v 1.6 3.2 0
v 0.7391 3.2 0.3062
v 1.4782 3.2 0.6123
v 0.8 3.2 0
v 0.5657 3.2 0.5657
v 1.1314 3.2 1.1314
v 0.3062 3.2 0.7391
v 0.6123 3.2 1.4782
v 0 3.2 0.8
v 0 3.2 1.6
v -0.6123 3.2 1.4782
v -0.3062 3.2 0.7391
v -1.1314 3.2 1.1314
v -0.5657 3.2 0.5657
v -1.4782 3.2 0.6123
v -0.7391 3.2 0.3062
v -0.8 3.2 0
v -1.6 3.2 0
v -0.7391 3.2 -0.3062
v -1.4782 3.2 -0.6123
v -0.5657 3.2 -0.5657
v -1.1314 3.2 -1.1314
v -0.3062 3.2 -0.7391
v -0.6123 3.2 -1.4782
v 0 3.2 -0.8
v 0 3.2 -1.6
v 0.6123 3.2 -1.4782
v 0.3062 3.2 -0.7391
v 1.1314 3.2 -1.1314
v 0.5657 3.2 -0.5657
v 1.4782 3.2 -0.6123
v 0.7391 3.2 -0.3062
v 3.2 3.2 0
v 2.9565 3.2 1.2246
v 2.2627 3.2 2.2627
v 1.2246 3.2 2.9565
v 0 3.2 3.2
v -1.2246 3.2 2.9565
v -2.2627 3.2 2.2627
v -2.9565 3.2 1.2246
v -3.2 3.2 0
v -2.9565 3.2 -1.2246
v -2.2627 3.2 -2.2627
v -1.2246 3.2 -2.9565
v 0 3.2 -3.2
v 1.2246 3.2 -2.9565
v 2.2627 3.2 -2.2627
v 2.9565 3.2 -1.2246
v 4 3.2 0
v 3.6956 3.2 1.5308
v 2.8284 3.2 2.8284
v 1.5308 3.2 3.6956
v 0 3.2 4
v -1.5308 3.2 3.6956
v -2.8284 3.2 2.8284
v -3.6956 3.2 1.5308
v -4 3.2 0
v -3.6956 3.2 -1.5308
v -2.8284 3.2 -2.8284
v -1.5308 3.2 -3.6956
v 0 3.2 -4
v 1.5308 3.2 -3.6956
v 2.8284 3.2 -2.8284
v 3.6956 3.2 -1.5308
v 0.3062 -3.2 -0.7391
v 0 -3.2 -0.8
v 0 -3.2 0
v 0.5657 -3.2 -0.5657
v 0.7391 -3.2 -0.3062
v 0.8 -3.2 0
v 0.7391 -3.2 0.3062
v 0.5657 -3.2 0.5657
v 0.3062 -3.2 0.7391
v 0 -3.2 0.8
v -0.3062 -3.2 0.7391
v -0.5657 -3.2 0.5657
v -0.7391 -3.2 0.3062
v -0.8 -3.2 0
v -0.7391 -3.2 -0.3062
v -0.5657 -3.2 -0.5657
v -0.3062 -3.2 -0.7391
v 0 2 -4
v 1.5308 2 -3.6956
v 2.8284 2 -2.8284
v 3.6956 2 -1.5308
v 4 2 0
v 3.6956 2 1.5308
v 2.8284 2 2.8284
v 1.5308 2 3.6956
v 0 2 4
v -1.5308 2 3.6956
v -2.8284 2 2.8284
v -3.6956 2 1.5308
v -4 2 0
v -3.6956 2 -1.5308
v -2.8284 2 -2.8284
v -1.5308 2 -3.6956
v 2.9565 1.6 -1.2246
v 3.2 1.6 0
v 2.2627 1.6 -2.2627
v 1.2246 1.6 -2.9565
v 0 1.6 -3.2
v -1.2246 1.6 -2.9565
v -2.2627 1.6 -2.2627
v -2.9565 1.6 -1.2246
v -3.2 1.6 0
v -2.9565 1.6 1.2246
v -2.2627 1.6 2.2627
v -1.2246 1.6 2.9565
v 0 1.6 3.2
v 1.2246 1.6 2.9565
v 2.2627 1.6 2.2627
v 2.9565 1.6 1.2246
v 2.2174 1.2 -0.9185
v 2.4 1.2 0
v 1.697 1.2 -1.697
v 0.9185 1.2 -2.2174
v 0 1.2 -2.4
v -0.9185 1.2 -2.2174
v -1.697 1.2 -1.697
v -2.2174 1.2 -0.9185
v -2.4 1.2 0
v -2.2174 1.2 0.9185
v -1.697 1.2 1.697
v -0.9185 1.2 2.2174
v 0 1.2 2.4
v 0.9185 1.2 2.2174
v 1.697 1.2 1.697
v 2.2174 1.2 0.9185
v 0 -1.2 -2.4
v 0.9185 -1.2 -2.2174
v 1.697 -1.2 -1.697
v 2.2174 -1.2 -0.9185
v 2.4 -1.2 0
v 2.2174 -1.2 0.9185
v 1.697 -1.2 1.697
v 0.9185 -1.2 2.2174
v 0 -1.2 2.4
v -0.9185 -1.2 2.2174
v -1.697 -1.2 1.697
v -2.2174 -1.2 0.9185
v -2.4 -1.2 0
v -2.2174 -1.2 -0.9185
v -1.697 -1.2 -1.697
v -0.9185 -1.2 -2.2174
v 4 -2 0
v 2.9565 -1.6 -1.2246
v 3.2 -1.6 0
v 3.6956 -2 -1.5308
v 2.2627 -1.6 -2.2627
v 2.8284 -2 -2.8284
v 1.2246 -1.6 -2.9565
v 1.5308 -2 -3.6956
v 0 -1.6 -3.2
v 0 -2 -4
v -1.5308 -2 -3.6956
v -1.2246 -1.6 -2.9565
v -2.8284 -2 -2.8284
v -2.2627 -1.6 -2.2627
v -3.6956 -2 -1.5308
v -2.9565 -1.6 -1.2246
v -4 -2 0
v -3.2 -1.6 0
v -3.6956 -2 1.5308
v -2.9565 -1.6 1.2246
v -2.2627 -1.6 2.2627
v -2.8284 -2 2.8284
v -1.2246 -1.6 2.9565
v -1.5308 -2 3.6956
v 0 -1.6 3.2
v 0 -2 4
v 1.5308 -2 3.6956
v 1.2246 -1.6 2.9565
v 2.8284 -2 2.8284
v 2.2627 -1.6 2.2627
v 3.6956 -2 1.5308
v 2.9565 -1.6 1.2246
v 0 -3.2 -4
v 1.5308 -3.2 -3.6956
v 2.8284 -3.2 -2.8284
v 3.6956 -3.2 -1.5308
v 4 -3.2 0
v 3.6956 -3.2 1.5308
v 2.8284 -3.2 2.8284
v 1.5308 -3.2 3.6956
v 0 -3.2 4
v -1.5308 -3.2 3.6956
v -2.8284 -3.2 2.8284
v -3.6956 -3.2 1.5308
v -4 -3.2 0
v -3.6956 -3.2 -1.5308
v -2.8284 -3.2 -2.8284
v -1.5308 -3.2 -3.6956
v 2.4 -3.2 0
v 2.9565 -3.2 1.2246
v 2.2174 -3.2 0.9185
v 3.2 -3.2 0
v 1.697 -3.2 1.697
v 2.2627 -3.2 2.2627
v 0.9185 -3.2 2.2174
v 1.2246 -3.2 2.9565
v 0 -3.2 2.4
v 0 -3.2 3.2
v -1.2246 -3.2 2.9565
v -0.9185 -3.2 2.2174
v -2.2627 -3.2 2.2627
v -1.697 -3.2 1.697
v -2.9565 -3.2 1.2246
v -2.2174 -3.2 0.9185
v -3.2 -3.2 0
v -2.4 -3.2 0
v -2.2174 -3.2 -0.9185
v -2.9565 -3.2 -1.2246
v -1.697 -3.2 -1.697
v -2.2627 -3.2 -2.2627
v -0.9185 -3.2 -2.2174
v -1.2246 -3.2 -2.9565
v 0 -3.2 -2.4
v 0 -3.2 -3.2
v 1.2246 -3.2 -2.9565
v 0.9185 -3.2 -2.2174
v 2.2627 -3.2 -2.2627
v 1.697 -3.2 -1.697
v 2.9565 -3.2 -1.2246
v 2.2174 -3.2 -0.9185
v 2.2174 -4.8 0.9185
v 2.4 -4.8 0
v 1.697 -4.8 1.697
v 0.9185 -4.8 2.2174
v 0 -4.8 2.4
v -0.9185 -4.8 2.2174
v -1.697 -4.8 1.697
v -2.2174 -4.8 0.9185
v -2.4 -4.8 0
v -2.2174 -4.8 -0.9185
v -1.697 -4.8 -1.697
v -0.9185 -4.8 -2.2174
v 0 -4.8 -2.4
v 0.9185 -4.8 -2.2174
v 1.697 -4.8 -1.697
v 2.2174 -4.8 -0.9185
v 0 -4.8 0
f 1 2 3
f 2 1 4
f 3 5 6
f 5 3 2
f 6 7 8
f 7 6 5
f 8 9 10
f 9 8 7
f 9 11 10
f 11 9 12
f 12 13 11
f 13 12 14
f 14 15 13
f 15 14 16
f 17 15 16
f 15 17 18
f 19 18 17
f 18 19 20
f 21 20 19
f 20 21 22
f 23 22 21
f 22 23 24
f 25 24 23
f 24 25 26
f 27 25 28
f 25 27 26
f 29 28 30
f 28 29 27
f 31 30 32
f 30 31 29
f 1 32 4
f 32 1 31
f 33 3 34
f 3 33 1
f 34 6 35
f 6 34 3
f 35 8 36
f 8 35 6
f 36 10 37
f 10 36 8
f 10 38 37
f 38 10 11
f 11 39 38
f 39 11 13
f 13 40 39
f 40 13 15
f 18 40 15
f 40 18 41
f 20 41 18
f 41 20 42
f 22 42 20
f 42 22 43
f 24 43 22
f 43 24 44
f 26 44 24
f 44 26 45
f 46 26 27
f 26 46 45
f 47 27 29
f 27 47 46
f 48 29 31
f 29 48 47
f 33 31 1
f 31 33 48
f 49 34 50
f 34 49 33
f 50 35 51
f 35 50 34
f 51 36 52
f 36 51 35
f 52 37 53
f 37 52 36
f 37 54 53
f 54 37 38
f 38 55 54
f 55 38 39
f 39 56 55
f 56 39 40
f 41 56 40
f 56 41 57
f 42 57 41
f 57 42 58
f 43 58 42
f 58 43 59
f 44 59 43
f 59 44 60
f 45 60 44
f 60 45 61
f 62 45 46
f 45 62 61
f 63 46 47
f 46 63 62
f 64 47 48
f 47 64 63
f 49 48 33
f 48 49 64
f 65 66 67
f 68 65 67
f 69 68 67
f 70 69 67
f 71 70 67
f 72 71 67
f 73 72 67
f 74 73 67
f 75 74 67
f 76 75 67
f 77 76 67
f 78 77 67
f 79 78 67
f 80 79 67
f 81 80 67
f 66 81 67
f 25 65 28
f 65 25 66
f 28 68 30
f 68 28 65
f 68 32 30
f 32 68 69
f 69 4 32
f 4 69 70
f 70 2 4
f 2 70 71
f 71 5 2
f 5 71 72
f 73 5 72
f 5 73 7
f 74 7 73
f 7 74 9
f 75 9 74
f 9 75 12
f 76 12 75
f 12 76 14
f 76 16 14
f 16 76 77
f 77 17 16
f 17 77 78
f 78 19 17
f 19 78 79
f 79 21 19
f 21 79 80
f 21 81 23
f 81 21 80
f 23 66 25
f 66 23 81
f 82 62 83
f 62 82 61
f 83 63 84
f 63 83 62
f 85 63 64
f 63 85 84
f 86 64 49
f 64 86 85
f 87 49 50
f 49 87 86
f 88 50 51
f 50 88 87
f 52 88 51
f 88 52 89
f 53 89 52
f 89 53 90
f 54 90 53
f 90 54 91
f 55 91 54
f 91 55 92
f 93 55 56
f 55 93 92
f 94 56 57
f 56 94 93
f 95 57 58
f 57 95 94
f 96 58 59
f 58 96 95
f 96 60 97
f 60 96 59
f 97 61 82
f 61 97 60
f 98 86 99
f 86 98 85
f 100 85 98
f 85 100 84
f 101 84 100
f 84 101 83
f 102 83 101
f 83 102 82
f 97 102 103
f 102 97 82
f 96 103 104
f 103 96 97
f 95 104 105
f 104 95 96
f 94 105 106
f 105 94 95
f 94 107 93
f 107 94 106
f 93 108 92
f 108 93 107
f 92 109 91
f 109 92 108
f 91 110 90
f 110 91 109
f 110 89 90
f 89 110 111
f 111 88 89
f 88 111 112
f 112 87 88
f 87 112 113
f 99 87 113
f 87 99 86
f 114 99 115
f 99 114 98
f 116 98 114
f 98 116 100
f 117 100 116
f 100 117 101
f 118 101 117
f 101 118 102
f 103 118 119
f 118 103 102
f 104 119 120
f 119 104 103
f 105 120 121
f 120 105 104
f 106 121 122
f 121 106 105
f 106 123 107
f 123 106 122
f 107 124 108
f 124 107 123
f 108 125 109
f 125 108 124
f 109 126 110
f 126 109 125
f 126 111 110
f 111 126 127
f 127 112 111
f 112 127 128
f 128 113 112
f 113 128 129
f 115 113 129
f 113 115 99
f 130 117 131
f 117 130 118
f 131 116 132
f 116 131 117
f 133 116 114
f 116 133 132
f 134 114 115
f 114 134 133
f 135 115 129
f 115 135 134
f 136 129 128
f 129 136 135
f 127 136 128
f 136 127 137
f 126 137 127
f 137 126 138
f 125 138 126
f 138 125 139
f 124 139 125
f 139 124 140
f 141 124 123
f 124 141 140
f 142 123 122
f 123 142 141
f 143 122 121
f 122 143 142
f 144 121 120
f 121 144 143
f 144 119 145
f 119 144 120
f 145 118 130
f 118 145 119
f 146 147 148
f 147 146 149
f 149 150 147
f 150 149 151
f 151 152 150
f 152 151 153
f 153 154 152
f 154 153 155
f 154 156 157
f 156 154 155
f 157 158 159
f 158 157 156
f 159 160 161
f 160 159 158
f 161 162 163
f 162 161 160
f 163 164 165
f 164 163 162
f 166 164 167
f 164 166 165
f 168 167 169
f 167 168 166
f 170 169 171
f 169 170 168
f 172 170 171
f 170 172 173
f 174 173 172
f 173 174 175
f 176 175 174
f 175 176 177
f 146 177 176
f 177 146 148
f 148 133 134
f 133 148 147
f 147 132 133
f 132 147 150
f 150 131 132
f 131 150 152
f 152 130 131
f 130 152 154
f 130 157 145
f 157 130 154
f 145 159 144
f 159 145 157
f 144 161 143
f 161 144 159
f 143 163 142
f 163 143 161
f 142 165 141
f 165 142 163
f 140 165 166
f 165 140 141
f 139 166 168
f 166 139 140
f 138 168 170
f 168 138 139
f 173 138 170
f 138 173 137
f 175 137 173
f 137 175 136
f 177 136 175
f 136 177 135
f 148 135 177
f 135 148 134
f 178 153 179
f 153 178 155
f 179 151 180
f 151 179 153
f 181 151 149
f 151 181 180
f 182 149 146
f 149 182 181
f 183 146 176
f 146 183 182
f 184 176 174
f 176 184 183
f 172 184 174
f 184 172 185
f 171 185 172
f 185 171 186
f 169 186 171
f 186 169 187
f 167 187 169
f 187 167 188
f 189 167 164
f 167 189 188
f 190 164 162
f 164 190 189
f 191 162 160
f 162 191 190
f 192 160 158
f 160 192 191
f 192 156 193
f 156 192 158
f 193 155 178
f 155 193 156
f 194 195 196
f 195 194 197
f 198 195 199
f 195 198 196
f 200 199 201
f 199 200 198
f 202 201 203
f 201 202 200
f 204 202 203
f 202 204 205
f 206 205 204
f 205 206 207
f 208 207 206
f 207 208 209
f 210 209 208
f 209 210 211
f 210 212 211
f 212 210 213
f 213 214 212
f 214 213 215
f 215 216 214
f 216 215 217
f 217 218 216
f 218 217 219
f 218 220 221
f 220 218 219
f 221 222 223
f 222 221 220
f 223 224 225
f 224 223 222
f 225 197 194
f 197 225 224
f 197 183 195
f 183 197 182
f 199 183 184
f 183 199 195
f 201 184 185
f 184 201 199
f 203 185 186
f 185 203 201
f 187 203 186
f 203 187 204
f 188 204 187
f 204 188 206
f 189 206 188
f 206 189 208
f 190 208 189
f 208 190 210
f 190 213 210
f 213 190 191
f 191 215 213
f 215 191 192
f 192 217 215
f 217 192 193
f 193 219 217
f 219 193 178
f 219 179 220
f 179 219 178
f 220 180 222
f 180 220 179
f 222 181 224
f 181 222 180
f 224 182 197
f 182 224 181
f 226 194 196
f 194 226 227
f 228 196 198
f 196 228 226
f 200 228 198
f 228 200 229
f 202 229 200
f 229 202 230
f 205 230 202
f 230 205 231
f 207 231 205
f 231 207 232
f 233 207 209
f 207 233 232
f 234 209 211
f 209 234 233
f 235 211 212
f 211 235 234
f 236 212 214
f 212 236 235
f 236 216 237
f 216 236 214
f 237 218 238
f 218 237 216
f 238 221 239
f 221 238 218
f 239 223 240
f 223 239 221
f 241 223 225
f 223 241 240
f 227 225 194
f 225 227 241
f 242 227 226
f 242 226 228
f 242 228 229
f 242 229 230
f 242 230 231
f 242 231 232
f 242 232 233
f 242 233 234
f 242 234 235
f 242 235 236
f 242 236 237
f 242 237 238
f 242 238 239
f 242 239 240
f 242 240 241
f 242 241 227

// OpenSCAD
// file: ../p/stud.scad
use <../lib.scad>
use <4-4cyli.scad>
use <4-4disc.scad>
use <4-4edge.scad>
function ldraw_lib__stud() = [
// 0 Stud
// 0 Name: stud.dat
// 0 Author: James Jessiman
// 0 !LDRAW_ORG Primitive UPDATE 2012-01
// 0 !LICENSE Licensed under CC BY 2.0 and CC BY 4.0 : see CAreadme.txt
// 
// 0 BFC CERTIFY CCW
  [0,"BFC","CERTIFY"],
  [0,"BFC","CCW"],
// 
// 0 !HISTORY 2002-04-04 [sbliss] Modified for BFC compliance
// 0 !HISTORY 2002-04-25 [PTadmin] Official Update 2002-02
// 0 !HISTORY 2007-06-24 [PTadmin] Header formatted for Contributor Agreement
// 0 !HISTORY 2008-07-01 [PTadmin] Official Update 2008-01
// 0 !HISTORY 2012-02-16 [Philo] Changed to CCW
// 0 !HISTORY 2012-03-30 [PTadmin] Official Update 2012-01
// 
// 
// 1 16 0 0 0 6 0 0 0 1 0 0 0 6 4-4edge.dat
  [1,16,0,0,0,6,0,0,0,1,0,0,0,6, ldraw_lib__4_4edge()],
// 1 16 0 -4 0 6 0 0 0 1 0 0 0 6 4-4edge.dat
  [1,16,0,-4,0,6,0,0,0,1,0,0,0,6, ldraw_lib__4_4edge()],
// 1 16 0 0 0 6 0 0 0 -4 0 0 0 6 4-4cyli.dat
  [1,16,0,0,0,6,0,0,0,-4,0,0,0,6, ldraw_lib__4_4cyli()],
// 1 16 0 -4 0 6 0 0 0 1 0 0 0 6 4-4disc.dat
  [1,16,0,-4,0,6,0,0,0,1,0,0,0,6, ldraw_lib__4_4disc()],
];
makepoly(ldraw_lib__stud(), line=0.2);
// file: ../p/4-4ring4.scad
use <../lib.scad>
function ldraw_lib__4_4ring4() = [
// 0 Ring  4 x 1.0
// 0 Name: 4-4ring4.dat
// 0 Author: James Jessiman
// 0 !LDRAW_ORG Primitive UPDATE 2009-01
// 0 !LICENSE Licensed under CC BY 2.0 and CC BY 4.0 : see CAreadme.txt
// 
// 0 BFC CERTIFY CCW
  [0,"BFC","CERTIFY"],
  [0,"BFC","CCW"],
// 
// 0 !HISTORY 1998-12-15 [PTadmin] Official Update 1998-10
// 0 !HISTORY 2002-04-08 [BrickCaster] Modified for BFC compliance
// 0 !HISTORY 2002-04-25 [PTadmin] Official Update 2002-02
// 0 !HISTORY 2007-06-24 [PTadmin] Header formatted for Contributor Agreement
// 0 !HISTORY 2008-07-01 [PTadmin] Official Update 2008-01
// 0 !HISTORY 2008-08-26 [cwdee] Switch polygon winding and rename
// 0 !HISTORY 2009-05-02 [PTadmin] Official Update 2009-01
// 
// 
// 4 16 -1.9135 0 4.6195 -1.5308 0 3.6956 0 0 4 0 0 5
  [4,16,-1.9135,0,4.6195,-1.5308,0,3.6956,0,0,4,0,0,5],
// 4 16 -3.5355 0 3.5355 -2.8284 0 2.8284 -1.5308 0 3.6956 -1.9135 0 4.6195
  [4,16,-3.5355,0,3.5355,-2.8284,0,2.8284,-1.5308,0,3.6956,-1.9135,0,4.6195],
// 4 16 -4.6195 0 1.9135 -3.6956 0 1.5308 -2.8284 0 2.8284 -3.5355 0 3.5355
  [4,16,-4.6195,0,1.9135,-3.6956,0,1.5308,-2.8284,0,2.8284,-3.5355,0,3.5355],
// 4 16 -5 0 0 -4 0 0 -3.6956 0 1.5308 -4.6195 0 1.9135
  [4,16,-5,0,0,-4,0,0,-3.6956,0,1.5308,-4.6195,0,1.9135],
// 4 16 -4.6195 0 -1.9135 -3.6956 0 -1.5308 -4 0 0 -5 0 0
  [4,16,-4.6195,0,-1.9135,-3.6956,0,-1.5308,-4,0,0,-5,0,0],
// 4 16 -3.5355 0 -3.5355 -2.8284 0 -2.8284 -3.6956 0 -1.5308 -4.6195 0 -1.9135
  [4,16,-3.5355,0,-3.5355,-2.8284,0,-2.8284,-3.6956,0,-1.5308,-4.6195,0,-1.9135],
// 4 16 -1.9135 0 -4.6195 -1.5308 0 -3.6956 -2.8284 0 -2.8284 -3.5355 0 -3.5355
  [4,16,-1.9135,0,-4.6195,-1.5308,0,-3.6956,-2.8284,0,-2.8284,-3.5355,0,-3.5355],
// 4 16 0 0 -5 0 0 -4 -1.5308 0 -3.6956 -1.9135 0 -4.6195
  [4,16,0,0,-5,0,0,-4,-1.5308,0,-3.6956,-1.9135,0,-4.6195],
// 4 16 1.9135 0 -4.6195 1.5308 0 -3.6956 0 0 -4 0 0 -5
  [4,16,1.9135,0,-4.6195,1.5308,0,-3.6956,0,0,-4,0,0,-5],
// 4 16 3.5355 0 -3.5355 2.8284 0 -2.8284 1.5308 0 -3.6956 1.9135 0 -4.6195
  [4,16,3.5355,0,-3.5355,2.8284,0,-2.8284,1.5308,0,-3.6956,1.9135,0,-4.6195],
// 4 16 4.6195 0 -1.9135 3.6956 0 -1.5308 2.8284 0 -2.8284 3.5355 0 -3.5355
  [4,16,4.6195,0,-1.9135,3.6956,0,-1.5308,2.8284,0,-2.8284,3.5355,0,-3.5355],
// 4 16 5 0 0 4 0 0 3.6956 0 -1.5308 4.6195 0 -1.9135
  [4,16,5,0,0,4,0,0,3.6956,0,-1.5308,4.6195,0,-1.9135],
// 4 16 4.6195 0 1.9135 3.6956 0 1.5308 4 0 0 5 0 0
  [4,16,4.6195,0,1.9135,3.6956,0,1.5308,4,0,0,5,0,0],
// 4 16 3.5355 0 3.5355 2.8284 0 2.8284 3.6956 0 1.5308 4.6195 0 1.9135
  [4,16,3.5355,0,3.5355,2.8284,0,2.8284,3.6956,0,1.5308,4.6195,0,1.9135],
// 4 16 1.9135 0 4.6195 1.5308 0 3.6956 2.8284 0 2.8284 3.5355 0 3.5355
  [4,16,1.9135,0,4.6195,1.5308,0,3.6956,2.8284,0,2.8284,3.5355,0,3.5355],
// 4 16 0 0 5 0 0 4 1.5308 0 3.6956 1.9135 0 4.6195
  [4,16,0,0,5,0,0,4,1.5308,0,3.6956,1.9135,0,4.6195],
// 0
];
makepoly(ldraw_lib__4_4ring4(), line=0.2);
// file: ../p/4-4ring3.scad
use <../lib.scad>
function ldraw_lib__4_4ring3() = [
// 0 Ring  3 x 1.0
// 0 Name: 4-4ring3.dat
// 0 Author: James Jessiman
// 0 !LDRAW_ORG Primitive UPDATE 2009-01
// 0 !LICENSE Licensed under CC BY 2.0 and CC BY 4.0 : see CAreadme.txt
// 
// 0 BFC CERTIFY CCW
  [0,"BFC","CERTIFY"],
  [0,"BFC","CCW"],
// 
// 0 !HISTORY 1998-12-15 [PTadmin] Official Update 1998-10
// 0 !HISTORY 2002-04-05 [hafhead] Added BFC statement
// 0 !HISTORY 2002-04-25 [PTadmin] Official Update 2002-02
// 0 !HISTORY 2007-06-24 [PTadmin] Header formatted for Contributor Agreement
// 0 !HISTORY 2008-07-01 [PTadmin] Official Update 2008-01
// 0 !HISTORY 2008-08-26 [cwdee] Switch polygon winding and rename
// 0 !HISTORY 2009-05-02 [PTadmin] Official Update 2009-01
// 
// 
// 4 16 -1.5308 0 3.6956 -1.1481 0 2.7717 0 0 3 0 0 4
  [4,16,-1.5308,0,3.6956,-1.1481,0,2.7717,0,0,3,0,0,4],
// 4 16 -2.8284 0 2.8284 -2.1213 0 2.1213 -1.1481 0 2.7717 -1.5308 0 3.6956
  [4,16,-2.8284,0,2.8284,-2.1213,0,2.1213,-1.1481,0,2.7717,-1.5308,0,3.6956],
// 4 16 -3.6956 0 1.5308 -2.7717 0 1.1481 -2.1213 0 2.1213 -2.8284 0 2.8284
  [4,16,-3.6956,0,1.5308,-2.7717,0,1.1481,-2.1213,0,2.1213,-2.8284,0,2.8284],
// 4 16 -4 0 0 -3 0 0 -2.7717 0 1.1481 -3.6956 0 1.5308
  [4,16,-4,0,0,-3,0,0,-2.7717,0,1.1481,-3.6956,0,1.5308],
// 4 16 -3.6956 0 -1.5308 -2.7717 0 -1.1481 -3 0 0 -4 0 0
  [4,16,-3.6956,0,-1.5308,-2.7717,0,-1.1481,-3,0,0,-4,0,0],
// 4 16 -2.8284 0 -2.8284 -2.1213 0 -2.1213 -2.7717 0 -1.1481 -3.6956 0 -1.5308
  [4,16,-2.8284,0,-2.8284,-2.1213,0,-2.1213,-2.7717,0,-1.1481,-3.6956,0,-1.5308],
// 4 16 -1.5308 0 -3.6956 -1.1481 0 -2.7717 -2.1213 0 -2.1213 -2.8284 0 -2.8284
  [4,16,-1.5308,0,-3.6956,-1.1481,0,-2.7717,-2.1213,0,-2.1213,-2.8284,0,-2.8284],
// 4 16 0 0 -4 0 0 -3 -1.1481 0 -2.7717 -1.5308 0 -3.6956
  [4,16,0,0,-4,0,0,-3,-1.1481,0,-2.7717,-1.5308,0,-3.6956],
// 4 16 1.5308 0 -3.6956 1.1481 0 -2.7717 0 0 -3 0 0 -4
  [4,16,1.5308,0,-3.6956,1.1481,0,-2.7717,0,0,-3,0,0,-4],
// 4 16 2.8284 0 -2.8284 2.1213 0 -2.1213 1.1481 0 -2.7717 1.5308 0 -3.6956
  [4,16,2.8284,0,-2.8284,2.1213,0,-2.1213,1.1481,0,-2.7717,1.5308,0,-3.6956],
// 4 16 3.6956 0 -1.5308 2.7717 0 -1.1481 2.1213 0 -2.1213 2.8284 0 -2.8284
  [4,16,3.6956,0,-1.5308,2.7717,0,-1.1481,2.1213,0,-2.1213,2.8284,0,-2.8284],
// 4 16 4 0 0 3 0 0 2.7717 0 -1.1481 3.6956 0 -1.5308
  [4,16,4,0,0,3,0,0,2.7717,0,-1.1481,3.6956,0,-1.5308],
// 4 16 3.6956 0 1.5308 2.7717 0 1.1481 3 0 0 4 0 0
  [4,16,3.6956,0,1.5308,2.7717,0,1.1481,3,0,0,4,0,0],
// 4 16 2.8284 0 2.8284 2.1213 0 2.1213 2.7717 0 1.1481 3.6956 0 1.5308
  [4,16,2.8284,0,2.8284,2.1213,0,2.1213,2.7717,0,1.1481,3.6956,0,1.5308],
// 4 16 1.5308 0 3.6956 1.1481 0 2.7717 2.1213 0 2.1213 2.8284 0 2.8284
  [4,16,1.5308,0,3.6956,1.1481,0,2.7717,2.1213,0,2.1213,2.8284,0,2.8284],
// 4 16 0 0 4 0 0 3 1.1481 0 2.7717 1.5308 0 3.6956
  [4,16,0,0,4,0,0,3,1.1481,0,2.7717,1.5308,0,3.6956],
// 0
];
makepoly(ldraw_lib__4_4ring3(), line=0.2);
// file: ../p/4-4ring1.scad
use <../lib.scad>
function ldraw_lib__4_4ring1() = [
// 0 Ring  1 x 1.0
// 0 Name: 4-4ring1.dat
// 0 Author: James Jessiman
// 0 !LDRAW_ORG Primitive UPDATE 2009-01
// 0 !LICENSE Licensed under CC BY 2.0 and CC BY 4.0 : see CAreadme.txt
// 
// 0 BFC CERTIFY CCW
  [0,"BFC","CERTIFY"],
  [0,"BFC","CCW"],
// 
// 0 !HISTORY 1998-12-15 [PTadmin] Official Update 1998-10
// 0 !HISTORY 2002-04-08 [BrickCaster] Modified for BFC compliance
// 0 !HISTORY 2002-04-25 [PTadmin] Official Update 2002-02
// 0 !HISTORY 2007-06-24 [PTadmin] Header formatted for Contributor Agreement
// 0 !HISTORY 2008-07-01 [PTadmin] Official Update 2008-01
// 0 !HISTORY 2008-08-26 [cwdee] Switch polygon winding and rename
// 0 !HISTORY 2009-05-02 [PTadmin] Official Update 2009-01
// 
// 
// 4 16 -0.7654 0 1.8478 -0.3827 0 0.9239 0 0 1 0 0 2
  [4,16,-0.7654,0,1.8478,-0.3827,0,0.9239,0,0,1,0,0,2],
// 4 16 -1.4142 0 1.4142 -0.7071 0 0.7071 -0.3827 0 0.9239 -0.7654 0 1.8478
  [4,16,-1.4142,0,1.4142,-0.7071,0,0.7071,-0.3827,0,0.9239,-0.7654,0,1.8478],
// 4 16 -1.8478 0 0.7654 -0.9239 0 0.3827 -0.7071 0 0.7071 -1.4142 0 1.41420
  [4,16,-1.8478,0,0.7654,-0.9239,0,0.3827,-0.7071,0,0.7071,-1.4142,0,1.41420],
// 4 16 -2 0 0 -1 0 0 -0.9239 0 0.3827 -1.8478 0 0.7654
  [4,16,-2,0,0,-1,0,0,-0.9239,0,0.3827,-1.8478,0,0.7654],
// 4 16 -1.8478 0 -0.7654 -0.9239 0 -0.3827 -1 0 0 -2 0 0
  [4,16,-1.8478,0,-0.7654,-0.9239,0,-0.3827,-1,0,0,-2,0,0],
// 4 16 -1.4142 0 -1.4142 -0.7071 0 -0.7071 -0.9239 0 -0.3827 -1.8478 0 -0.7654
  [4,16,-1.4142,0,-1.4142,-0.7071,0,-0.7071,-0.9239,0,-0.3827,-1.8478,0,-0.7654],
// 4 16 -0.7654 0 -1.8478 -0.3827 0 -0.9239 -0.7071 0 -0.7071 -1.4142 0 -1.4142
  [4,16,-0.7654,0,-1.8478,-0.3827,0,-0.9239,-0.7071,0,-0.7071,-1.4142,0,-1.4142],
// 4 16 0 0 -2 0 0 -1 -0.3827 0 -0.9239 -0.7654 0 -1.8478
  [4,16,0,0,-2,0,0,-1,-0.3827,0,-0.9239,-0.7654,0,-1.8478],
// 4 16 0.7654 0 -1.8478 0.3827 0 -0.9239 0 0 -1 0 0 -2
  [4,16,0.7654,0,-1.8478,0.3827,0,-0.9239,0,0,-1,0,0,-2],
// 4 16 1.4142 0 -1.4142 0.7071 0 -0.7071 0.3827 0 -0.9239 0.7654 0 -1.8478
  [4,16,1.4142,0,-1.4142,0.7071,0,-0.7071,0.3827,0,-0.9239,0.7654,0,-1.8478],
// 4 16 1.8478 0 -0.7654 0.9239 0 -0.3827 0.7071 0 -0.7071 1.4142 0 -1.4142
  [4,16,1.8478,0,-0.7654,0.9239,0,-0.3827,0.7071,0,-0.7071,1.4142,0,-1.4142],
// 4 16 2 0 0 1 0 0 0.9239 0 -0.3827 1.8478 0 -0.7654
  [4,16,2,0,0,1,0,0,0.9239,0,-0.3827,1.8478,0,-0.7654],
// 4 16 1.8478 0 0.7654 0.9239 0 0.3827 1 0 0 2 0 0
  [4,16,1.8478,0,0.7654,0.9239,0,0.3827,1,0,0,2,0,0],
// 4 16 1.4142 0 1.4142 0.7071 0 0.7071 0.9239 0 0.3827 1.8478 0 0.7654
  [4,16,1.4142,0,1.4142,0.7071,0,0.7071,0.9239,0,0.3827,1.8478,0,0.7654],
// 4 16 0.7654 0 1.8478 0.3827 0 0.9239 0.7071 0 0.7071 1.4142 0 1.4142
  [4,16,0.7654,0,1.8478,0.3827,0,0.9239,0.7071,0,0.7071,1.4142,0,1.4142],
// 4 16 0 0 2 0 0 1 0.3827 0 0.9239 0.7654 0 1.8478
  [4,16,0,0,2,0,0,1,0.3827,0,0.9239,0.7654,0,1.8478],
// 0
];
makepoly(ldraw_lib__4_4ring1(), line=0.2);
// file: ../p/4-4edge.scad
use <../lib.scad>
function ldraw_lib__4_4edge() = [
// 0 Circle 1.0
// 0 Name: 4-4edge.dat
// 0 Author: James Jessiman
// 0 !LDRAW_ORG Primitive UPDATE 2017-01
// 0 !LICENSE Licensed under CC BY 2.0 and CC BY 4.0 : see CAreadme.txt
// 
// 0 BFC CERTIFY CCW
  [0,"BFC","CERTIFY"],
  [0,"BFC","CCW"],
// 
// 0 !HISTORY 1998-12-15 [PTadmin] Official Update 1998-10
// 0 !HISTORY 2005-12-28 [PTadmin] Official Update 2005-01
// 0 !HISTORY 2007-06-24 [PTadmin] Header formatted for Contributor Agreement
// 0 !HISTORY 2008-07-01 [PTadmin] Official Update 2008-01
// 0 !HISTORY 2017-01-15 [Steffen] BFCed
// 0 !HISTORY 2017-12-30 [PTadmin] Official Update 2017-01
// 
// 
// 2 24 1 0 0 0.9239 0 0.3827
  [2,24,1,0,0,0.9239,0,0.3827],
// 2 24 0.9239 0 0.3827 0.7071 0 0.7071
  [2,24,0.9239,0,0.3827,0.7071,0,0.7071],
// 2 24 0.7071 0 0.7071 0.3827 0 0.9239
  [2,24,0.7071,0,0.7071,0.3827,0,0.9239],
// 2 24 0.3827 0 0.9239 0 0 1
  [2,24,0.3827,0,0.9239,0,0,1],
// 2 24 0 0 1 -0.3827 0 0.9239
  [2,24,0,0,1,-0.3827,0,0.9239],
// 2 24 -0.3827 0 0.9239 -0.7071 0 0.7071
  [2,24,-0.3827,0,0.9239,-0.7071,0,0.7071],
// 2 24 -0.7071 0 0.7071 -0.9239 0 0.3827
  [2,24,-0.7071,0,0.7071,-0.9239,0,0.3827],
// 2 24 -0.9239 0 0.3827 -1 0 -0
  [2,24,-0.9239,0,0.3827,-1,0,-0],
// 2 24 -1 0 -0 -0.9239 0 -0.3827
  [2,24,-1,0,-0,-0.9239,0,-0.3827],
// 2 24 -0.9239 0 -0.3827 -0.7071 0 -0.7071
  [2,24,-0.9239,0,-0.3827,-0.7071,0,-0.7071],
// 2 24 -0.7071 0 -0.7071 -0.3827 0 -0.9239
  [2,24,-0.7071,0,-0.7071,-0.3827,0,-0.9239],
// 2 24 -0.3827 0 -0.9239 0 0 -1
  [2,24,-0.3827,0,-0.9239,0,0,-1],
// 2 24 0 0 -1 0.3827 0 -0.9239
  [2,24,0,0,-1,0.3827,0,-0.9239],
// 2 24 0.3827 0 -0.9239 0.7071 0 -0.7071
  [2,24,0.3827,0,-0.9239,0.7071,0,-0.7071],
// 2 24 0.7071 0 -0.7071 0.9239 0 -0.3827
  [2,24,0.7071,0,-0.7071,0.9239,0,-0.3827],
// 2 24 0.9239 0 -0.3827 1 0 0
  [2,24,0.9239,0,-0.3827,1,0,0],
];
makepoly(ldraw_lib__4_4edge(), line=0.2);
// file: ../p/4-4disc.scad
use <../lib.scad>
function ldraw_lib__4_4disc() = [
// 0 Disc 1.0
// 0 Name: 4-4disc.dat
// 0 Author: James Jessiman
// 0 !LDRAW_ORG Primitive UPDATE 2002-02
// 0 !LICENSE Licensed under CC BY 2.0 and CC BY 4.0 : see CAreadme.txt
// 
// 0 BFC CERTIFY CCW
  [0,"BFC","CERTIFY"],
  [0,"BFC","CCW"],
// 
// 0 !HISTORY 1998-12-15 [PTadmin] Official Update 1998-10
// 0 !HISTORY 2002-03-23 [sbliss] Added BFC statement
// 0 !HISTORY 2002-04-25 [PTadmin] Official Update 2002-02
// 0 !HISTORY 2007-06-24 [PTadmin] Header formatted for Contributor Agreement
// 0 !HISTORY 2008-07-01 [PTadmin] Official Update 2008-01
// 
// 
// 3 16 0 0 0 1 0 0 0.9239 0 0.3827
  [3,16,0,0,0,1,0,0,0.9239,0,0.3827],
// 3 16 0 0 0 0.9239 0 0.3827 0.7071 0 0.7071
  [3,16,0,0,0,0.9239,0,0.3827,0.7071,0,0.7071],
// 3 16 0 0 0 0.7071 0 0.7071 0.3827 0 0.9239
  [3,16,0,0,0,0.7071,0,0.7071,0.3827,0,0.9239],
// 3 16 0 0 0 0.3827 0 0.9239 0 0 1
  [3,16,0,0,0,0.3827,0,0.9239,0,0,1],
// 3 16 0 0 0 0 0 1 -0.3827 0 0.9239
  [3,16,0,0,0,0,0,1,-0.3827,0,0.9239],
// 3 16 0 0 0 -0.3827 0 0.9239 -0.7071 0 0.7071
  [3,16,0,0,0,-0.3827,0,0.9239,-0.7071,0,0.7071],
// 3 16 0 0 0 -0.7071 0 0.7071 -0.9239 0 0.3827
  [3,16,0,0,0,-0.7071,0,0.7071,-0.9239,0,0.3827],
// 3 16 0 0 0 -0.9239 0 0.3827 -1 0 -0
  [3,16,0,0,0,-0.9239,0,0.3827,-1,0,-0],
// 3 16 0 0 0 -1 0 -0 -0.9239 0 -0.3827
  [3,16,0,0,0,-1,0,-0,-0.9239,0,-0.3827],
// 3 16 0 0 0 -0.9239 0 -0.3827 -0.7071 0 -0.7071
  [3,16,0,0,0,-0.9239,0,-0.3827,-0.7071,0,-0.7071],
// 3 16 0 0 0 -0.7071 0 -0.7071 -0.3827 0 -0.9239
  [3,16,0,0,0,-0.7071,0,-0.7071,-0.3827,0,-0.9239],
// 3 16 0 0 0 -0.3827 0 -0.9239 0 0 -1
  [3,16,0,0,0,-0.3827,0,-0.9239,0,0,-1],
// 3 16 0 0 0 0 0 -1 0.3827 0 -0.9239
  [3,16,0,0,0,0,0,-1,0.3827,0,-0.9239],
// 3 16 0 0 0 0.3827 0 -0.9239 0.7071 0 -0.7071
  [3,16,0,0,0,0.3827,0,-0.9239,0.7071,0,-0.7071],
// 3 16 0 0 0 0.7071 0 -0.7071 0.9239 0 -0.3827
  [3,16,0,0,0,0.7071,0,-0.7071,0.9239,0,-0.3827],
// 3 16 0 0 0 0.9239 0 -0.3827 1 0 0
  [3,16,0,0,0,0.9239,0,-0.3827,1,0,0],
// 0
];
makepoly(ldraw_lib__4_4disc(), line=0.2);
// file: ../p/4-4cyli.scad
use <../lib.scad>
function ldraw_lib__4_4cyli() = [
// 0 Cylinder 1.0
// 0 Name: 4-4cyli.dat
// 0 Author: James Jessiman
// 0 !LDRAW_ORG Primitive UPDATE 2005-01
// 0 !LICENSE Licensed under CC BY 2.0 and CC BY 4.0 : see CAreadme.txt
// 
// 0 BFC CERTIFY CCW
  [0,"BFC","CERTIFY"],
  [0,"BFC","CCW"],
// 
// 0 !HISTORY 1998-12-15 [PTadmin] Official Update 1998-10
// 0 !HISTORY 2002-03-23 [sbliss] Added BFC statement; merged headers from files in distributions LDraw 0.27 and Complete.
// 0 !HISTORY 2002-04-25 [PTadmin] Official Update 2002-02
// 0 !HISTORY 2004-12-14 [guyvivan] BFC CCW
// 0 !HISTORY 2005-12-28 [PTadmin] Official Update 2005-01
// 0 !HISTORY 2007-06-24 [PTadmin] Header formatted for Contributor Agreement
// 0 !HISTORY 2008-07-01 [PTadmin] Official Update 2008-01
// 
// 
// 4 16 1 1 0 0.9239 1 0.3827 0.9239 0 0.3827 1 0 0
  [4,16,1,1,0,0.9239,1,0.3827,0.9239,0,0.3827,1,0,0],
// 5 24 1 0 0 1 1 0 0.9239 0 0.3827 0.9239 0 -0.3827
  [5,24,1,0,0,1,1,0,0.9239,0,0.3827,0.9239,0,-0.3827],
// 4 16 0.9239 1 0.3827 0.7071 1 0.7071 0.7071 0 0.7071 0.9239 0 0.3827
  [4,16,0.9239,1,0.3827,0.7071,1,0.7071,0.7071,0,0.7071,0.9239,0,0.3827],
// 5 24 0.9239 0 0.3827 0.9239 1 0.3827 0.7071 0 0.7071 1 0 0
  [5,24,0.9239,0,0.3827,0.9239,1,0.3827,0.7071,0,0.7071,1,0,0],
// 4 16 0.7071 1 0.7071 0.3827 1 0.9239 0.3827 0 0.9239 0.7071 0 0.7071
  [4,16,0.7071,1,0.7071,0.3827,1,0.9239,0.3827,0,0.9239,0.7071,0,0.7071],
// 5 24 0.7071 0 0.7071 0.7071 1 0.7071 0.3827 0 0.9239 0.9239 0 0.3827
  [5,24,0.7071,0,0.7071,0.7071,1,0.7071,0.3827,0,0.9239,0.9239,0,0.3827],
// 4 16 0.3827 1 0.9239 0 1 1 0 0 1 0.3827 0 0.9239
  [4,16,0.3827,1,0.9239,0,1,1,0,0,1,0.3827,0,0.9239],
// 5 24 0.3827 0 0.9239 0.3827 1 0.9239 0 0 1 0.7071 0 0.7071
  [5,24,0.3827,0,0.9239,0.3827,1,0.9239,0,0,1,0.7071,0,0.7071],
// 4 16 0 1 1 -0.3827 1 0.9239 -0.3827 0 0.9239 0 0 1
  [4,16,0,1,1,-0.3827,1,0.9239,-0.3827,0,0.9239,0,0,1],
// 5 24 0 0 1 0 1 1 -0.3827 0 0.9239 0.3827 0 0.9239
  [5,24,0,0,1,0,1,1,-0.3827,0,0.9239,0.3827,0,0.9239],
// 4 16 -0.3827 1 0.9239 -0.7071 1 0.7071 -0.7071 0 0.7071 -0.3827 0 0.9239
  [4,16,-0.3827,1,0.9239,-0.7071,1,0.7071,-0.7071,0,0.7071,-0.3827,0,0.9239],
// 5 24 -0.3827 0 0.9239 -0.3827 1 0.9239 -0.7071 0 0.7071 0 0 1
  [5,24,-0.3827,0,0.9239,-0.3827,1,0.9239,-0.7071,0,0.7071,0,0,1],
// 4 16 -0.7071 1 0.7071 -0.9239 1 0.3827 -0.9239 0 0.3827 -0.7071 0 0.7071
  [4,16,-0.7071,1,0.7071,-0.9239,1,0.3827,-0.9239,0,0.3827,-0.7071,0,0.7071],
// 5 24 -0.7071 0 0.7071 -0.7071 1 0.7071 -0.9239 0 0.3827 -0.3827 0 0.9239
  [5,24,-0.7071,0,0.7071,-0.7071,1,0.7071,-0.9239,0,0.3827,-0.3827,0,0.9239],
// 4 16 -0.9239 1 0.3827 -1 1 0 -1 0 0 -0.9239 0 0.3827
  [4,16,-0.9239,1,0.3827,-1,1,0,-1,0,0,-0.9239,0,0.3827],
// 5 24 -0.9239 0 0.3827 -0.9239 1 0.3827 -1 0 0 -0.7071 0 0.7071
  [5,24,-0.9239,0,0.3827,-0.9239,1,0.3827,-1,0,0,-0.7071,0,0.7071],
// 4 16 -1 1 0 -0.9239 1 -0.3827 -0.9239 0 -0.3827 -1 0 0
  [4,16,-1,1,0,-0.9239,1,-0.3827,-0.9239,0,-0.3827,-1,0,0],
// 5 24 -1 0 0 -1 1 0 -0.9239 0 -0.3827 -0.9239 0 0.3827
  [5,24,-1,0,0,-1,1,0,-0.9239,0,-0.3827,-0.9239,0,0.3827],
// 4 16 -0.9239 1 -0.3827 -0.7071 1 -0.7071 -0.7071 0 -0.7071 -0.9239 0 -0.3827
  [4,16,-0.9239,1,-0.3827,-0.7071,1,-0.7071,-0.7071,0,-0.7071,-0.9239,0,-0.3827],
// 5 24 -0.9239 0 -0.3827 -0.9239 1 -0.3827 -0.7071 0 -0.7071 -1 0 0
  [5,24,-0.9239,0,-0.3827,-0.9239,1,-0.3827,-0.7071,0,-0.7071,-1,0,0],
// 4 16 -0.7071 1 -0.7071 -0.3827 1 -0.9239 -0.3827 0 -0.9239 -0.7071 0 -0.7071
  [4,16,-0.7071,1,-0.7071,-0.3827,1,-0.9239,-0.3827,0,-0.9239,-0.7071,0,-0.7071],
// 5 24 -0.7071 0 -0.7071 -0.7071 1 -0.7071 -0.3827 0 -0.9239 -0.9239 0 -0.3827
  [5,24,-0.7071,0,-0.7071,-0.7071,1,-0.7071,-0.3827,0,-0.9239,-0.9239,0,-0.3827],
// 4 16 -0.3827 1 -0.9239 0 1 -1 0 0 -1 -0.3827 0 -0.9239
  [4,16,-0.3827,1,-0.9239,0,1,-1,0,0,-1,-0.3827,0,-0.9239],
// 5 24 -0.3827 0 -0.9239 -0.3827 1 -0.9239 0 0 -1 -0.7071 0 -0.7071
  [5,24,-0.3827,0,-0.9239,-0.3827,1,-0.9239,0,0,-1,-0.7071,0,-0.7071],
// 4 16 0 1 -1 0.3827 1 -0.9239 0.3827 0 -0.9239 0 0 -1
  [4,16,0,1,-1,0.3827,1,-0.9239,0.3827,0,-0.9239,0,0,-1],
// 5 24 0 0 -1 0 1 -1 0.3827 0 -0.9239 -0.3827 0 -0.9239
  [5,24,0,0,-1,0,1,-1,0.3827,0,-0.9239,-0.3827,0,-0.9239],
// 4 16 0.3827 1 -0.9239 0.7071 1 -0.7071 0.7071 0 -0.7071 0.3827 0 -0.9239
  [4,16,0.3827,1,-0.9239,0.7071,1,-0.7071,0.7071,0,-0.7071,0.3827,0,-0.9239],
// 5 24 0.3827 0 -0.9239 0.3827 1 -0.9239 0.7071 0 -0.7071 0 0 -1
  [5,24,0.3827,0,-0.9239,0.3827,1,-0.9239,0.7071,0,-0.7071,0,0,-1],
// 4 16 0.7071 1 -0.7071 0.9239 1 -0.3827 0.9239 0 -0.3827 0.7071 0 -0.7071
  [4,16,0.7071,1,-0.7071,0.9239,1,-0.3827,0.9239,0,-0.3827,0.7071,0,-0.7071],
// 5 24 0.7071 0 -0.7071 0.7071 1 -0.7071 0.9239 0 -0.3827 0.3827 0 -0.9239
  [5,24,0.7071,0,-0.7071,0.7071,1,-0.7071,0.9239,0,-0.3827,0.3827,0,-0.9239],
// 4 16 0.9239 1 -0.3827 1 1 0 1 0 0 0.9239 0 -0.3827
  [4,16,0.9239,1,-0.3827,1,1,0,1,0,0,0.9239,0,-0.3827],
// 5 24 0.9239 0 -0.3827 0.9239 1 -0.3827 1 0 0 0.7071 0 -0.7071
  [5,24,0.9239,0,-0.3827,0.9239,1,-0.3827,1,0,0,0.7071,0,-0.7071],
// 0
];
makepoly(ldraw_lib__4_4cyli(), line=0.2);
// file: ../p/4-4con4.scad
use <../lib.scad>
function ldraw_lib__4_4con4() = [
// 0 Cone  4 x 1.0
// 0 Name: 4-4con4.dat
// 0 Author: John Riley [jriley]
// 0 !LDRAW_ORG Primitive UPDATE 2012-01
// 0 !LICENSE Licensed under CC BY 2.0 and CC BY 4.0 : see CAreadme.txt
// 
// 0 BFC CERTIFY CCW
  [0,"BFC","CERTIFY"],
  [0,"BFC","CCW"],
// 
// 0 !HISTORY 2003-08-01 [PTadmin] Official Update 2003-02
// 0 !HISTORY 2007-06-24 [PTadmin] Header formatted for Contributor Agreement
// 0 !HISTORY 2008-07-01 [PTadmin] Official Update 2008-01
// 0 !HISTORY 2012-02-16 [Philo] Changed to CCW
// 0 !HISTORY 2012-03-30 [PTadmin] Official Update 2012-01
// 
// 
// 4 16 3.6956 1 1.5308 4.6195 0 1.9135 5 0 0 4 1 0
  [4,16,3.6956,1,1.5308,4.6195,0,1.9135,5,0,0,4,1,0],
// 4 16 2.8284 1 2.8284 3.5355 0 3.5355 4.6195 0 1.9135 3.6956 1 1.5308
  [4,16,2.8284,1,2.8284,3.5355,0,3.5355,4.6195,0,1.9135,3.6956,1,1.5308],
// 4 16 1.5308 1 3.6956 1.9135 0 4.6195 3.5355 0 3.5355 2.8284 1 2.8284
  [4,16,1.5308,1,3.6956,1.9135,0,4.6195,3.5355,0,3.5355,2.8284,1,2.8284],
// 4 16 0 1 4 0 0 5 1.9135 0 4.6195 1.5308 1 3.6956
  [4,16,0,1,4,0,0,5,1.9135,0,4.6195,1.5308,1,3.6956],
// 4 16 -1.5308 1 3.6956 -1.9135 0 4.6195 0 0 5 0 1 4
  [4,16,-1.5308,1,3.6956,-1.9135,0,4.6195,0,0,5,0,1,4],
// 4 16 -2.8284 1 2.8284 -3.5355 0 3.5355 -1.9135 0 4.6195 -1.5308 1 3.6956
  [4,16,-2.8284,1,2.8284,-3.5355,0,3.5355,-1.9135,0,4.6195,-1.5308,1,3.6956],
// 4 16 -3.6956 1 1.5308 -4.6195 0 1.9135 -3.5355 0 3.5355 -2.8284 1 2.8284
  [4,16,-3.6956,1,1.5308,-4.6195,0,1.9135,-3.5355,0,3.5355,-2.8284,1,2.8284],
// 4 16 -4 1 0 -5 0 0 -4.6195 0 1.9135 -3.6956 1 1.5308
  [4,16,-4,1,0,-5,0,0,-4.6195,0,1.9135,-3.6956,1,1.5308],
// 4 16 -3.6956 1 -1.5308 -4.6195 0 -1.9135 -5 0 0 -4 1 0
  [4,16,-3.6956,1,-1.5308,-4.6195,0,-1.9135,-5,0,0,-4,1,0],
// 4 16 -2.8284 1 -2.8284 -3.5355 0 -3.5355 -4.6195 0 -1.9135 -3.6956 1 -1.5308
  [4,16,-2.8284,1,-2.8284,-3.5355,0,-3.5355,-4.6195,0,-1.9135,-3.6956,1,-1.5308],
// 4 16 -1.5308 1 -3.6956 -1.9135 0 -4.6195 -3.5355 0 -3.5355 -2.8284 1 -2.8284
  [4,16,-1.5308,1,-3.6956,-1.9135,0,-4.6195,-3.5355,0,-3.5355,-2.8284,1,-2.8284],
// 4 16 0 1 -4 0 0 -5 -1.9135 0 -4.6195 -1.5308 1 -3.6956
  [4,16,0,1,-4,0,0,-5,-1.9135,0,-4.6195,-1.5308,1,-3.6956],
// 4 16 1.5308 1 -3.6956 1.9135 0 -4.6195 0 0 -5 0 1 -4
  [4,16,1.5308,1,-3.6956,1.9135,0,-4.6195,0,0,-5,0,1,-4],
// 4 16 2.8284 1 -2.8284 3.5355 0 -3.5355 1.9135 0 -4.6195 1.5308 1 -3.6956
  [4,16,2.8284,1,-2.8284,3.5355,0,-3.5355,1.9135,0,-4.6195,1.5308,1,-3.6956],
// 4 16 3.6956 1 -1.5308 4.6195 0 -1.9135 3.5355 0 -3.5355 2.8284 1 -2.8284
  [4,16,3.6956,1,-1.5308,4.6195,0,-1.9135,3.5355,0,-3.5355,2.8284,1,-2.8284],
// 4 16 4 1 0 5 0 0 4.6195 0 -1.9135 3.6956 1 -1.5308
  [4,16,4,1,0,5,0,0,4.6195,0,-1.9135,3.6956,1,-1.5308],
// 
// 5 24 4 1 0 5 0 0 3.6956 1 -1.5308 3.6956 1 1.5308
  [5,24,4,1,0,5,0,0,3.6956,1,-1.5308,3.6956,1,1.5308],
// 5 24 3.6956 1 1.5308 4.6195 0 1.9135 4 1 0 2.8284 1 2.8284
  [5,24,3.6956,1,1.5308,4.6195,0,1.9135,4,1,0,2.8284,1,2.8284],
// 5 24 2.8284 1 2.8284 3.5355 0 3.5355 3.6956 1 1.5308 1.5308 1 3.6956
  [5,24,2.8284,1,2.8284,3.5355,0,3.5355,3.6956,1,1.5308,1.5308,1,3.6956],
// 5 24 1.5308 1 3.6956 1.9135 0 4.6195 2.8284 1 2.8284 0 1 4
  [5,24,1.5308,1,3.6956,1.9135,0,4.6195,2.8284,1,2.8284,0,1,4],
// 5 24 0 1 4 0 0 5 1.5308 1 3.6956 -1.5308 1 3.6956
  [5,24,0,1,4,0,0,5,1.5308,1,3.6956,-1.5308,1,3.6956],
// 5 24 -1.5308 1 3.6956 -1.9135 0 4.6195 0 1 4 -2.8284 1 2.8284
  [5,24,-1.5308,1,3.6956,-1.9135,0,4.6195,0,1,4,-2.8284,1,2.8284],
// 5 24 -2.8284 1 2.8284 -3.5355 0 3.5355 -1.5308 1 3.6956 -3.6956 1 1.5308
  [5,24,-2.8284,1,2.8284,-3.5355,0,3.5355,-1.5308,1,3.6956,-3.6956,1,1.5308],
// 5 24 -3.6956 1 1.5308 -4.6195 0 1.9135 -2.8284 1 2.8284 -4 1 0
  [5,24,-3.6956,1,1.5308,-4.6195,0,1.9135,-2.8284,1,2.8284,-4,1,0],
// 5 24 -4 1 0 -5 0 0 -3.6956 1 1.5308 -3.6956 1 -1.5308
  [5,24,-4,1,0,-5,0,0,-3.6956,1,1.5308,-3.6956,1,-1.5308],
// 5 24 -3.6956 1 -1.5308 -4.6195 0 -1.9135 -4 1 0 -2.8284 1 -2.8284
  [5,24,-3.6956,1,-1.5308,-4.6195,0,-1.9135,-4,1,0,-2.8284,1,-2.8284],
// 5 24 -2.8284 1 -2.8284 -3.5355 0 -3.5355 -3.6956 1 -1.5308 -1.5308 1 -3.6956
  [5,24,-2.8284,1,-2.8284,-3.5355,0,-3.5355,-3.6956,1,-1.5308,-1.5308,1,-3.6956],
// 5 24 -1.5308 1 -3.6956 -1.9135 0 -4.6195 -2.8284 1 -2.8284 0 1 -4
  [5,24,-1.5308,1,-3.6956,-1.9135,0,-4.6195,-2.8284,1,-2.8284,0,1,-4],
// 5 24 0 1 -4 0 0 -5 -1.5308 1 -3.6956 1.5308 1 -3.6956
  [5,24,0,1,-4,0,0,-5,-1.5308,1,-3.6956,1.5308,1,-3.6956],
// 5 24 1.5308 1 -3.6956 1.9135 0 -4.6195 0 1 -4 2.8284 1 -2.8284
  [5,24,1.5308,1,-3.6956,1.9135,0,-4.6195,0,1,-4,2.8284,1,-2.8284],
// 5 24 2.8284 1 -2.8284 3.5355 0 -3.5355 1.5308 1 -3.6956 3.6956 1 -1.5308
  [5,24,2.8284,1,-2.8284,3.5355,0,-3.5355,1.5308,1,-3.6956,3.6956,1,-1.5308],
// 5 24 3.6956 1 -1.5308 4.6195 0 -1.9135 2.8284 1 -2.8284 4 1 0
  [5,24,3.6956,1,-1.5308,4.6195,0,-1.9135,2.8284,1,-2.8284,4,1,0],
];
makepoly(ldraw_lib__4_4con4(), line=0.2);
// file: ../p/4-4con3.scad
use <../lib.scad>
function ldraw_lib__4_4con3() = [
// 0 Cone  3 x 1.0
// 0 Name: 4-4con3.dat
// 0 Author: Niels Karsdorp [nielsk]
// 0 !LDRAW_ORG Primitive UPDATE 2003-02
// 0 !LICENSE Licensed under CC BY 2.0 and CC BY 4.0 : see CAreadme.txt
// 
// 0 BFC CERTIFY CCW
  [0,"BFC","CERTIFY"],
  [0,"BFC","CCW"],
// 
// 0 !HISTORY 2003-08-01 [PTadmin] Official Update 2003-02
// 0 !HISTORY 2007-06-24 [PTadmin] Header formatted for Contributor Agreement
// 0 !HISTORY 2008-07-01 [PTadmin] Official Update 2008-01
// 
// 
// 5 24 3 1 0 4 0 0 2.7717 1 1.1481 2.7717 1 -1.1481
  [5,24,3,1,0,4,0,0,2.7717,1,1.1481,2.7717,1,-1.1481],
// 5 24 2.7717 1 1.1481 3.6956 0 1.5308 2.1213 1 2.1213 3 1 0
  [5,24,2.7717,1,1.1481,3.6956,0,1.5308,2.1213,1,2.1213,3,1,0],
// 5 24 2.1213 1 2.1213 2.8284 0 2.8284 1.1481 1 2.7717 2.7717 1 1.1481
  [5,24,2.1213,1,2.1213,2.8284,0,2.8284,1.1481,1,2.7717,2.7717,1,1.1481],
// 5 24 1.1481 1 2.7717 1.5308 0 3.6956 0 1 3 2.1213 1 2.1213
  [5,24,1.1481,1,2.7717,1.5308,0,3.6956,0,1,3,2.1213,1,2.1213],
// 5 24 0 1 3 0 0 4 -1.1481 1 2.7717 1.1481 1 2.7717
  [5,24,0,1,3,0,0,4,-1.1481,1,2.7717,1.1481,1,2.7717],
// 5 24 -1.1481 1 2.7717 -1.5308 0 3.6956 -2.1213 1 2.1213 0 1 3
  [5,24,-1.1481,1,2.7717,-1.5308,0,3.6956,-2.1213,1,2.1213,0,1,3],
// 5 24 -2.1213 1 2.1213 -2.8284 0 2.8284 -2.7717 1 1.1481 -1.1481 1 2.7717
  [5,24,-2.1213,1,2.1213,-2.8284,0,2.8284,-2.7717,1,1.1481,-1.1481,1,2.7717],
// 5 24 -2.7717 1 1.1481 -3.6956 0 1.5308 -3 1 0 -2.1213 1 2.1213
  [5,24,-2.7717,1,1.1481,-3.6956,0,1.5308,-3,1,0,-2.1213,1,2.1213],
// 5 24 -3 1 0 -4 0 0 -2.7717 1 -1.1481 -2.7717 1 1.1481
  [5,24,-3,1,0,-4,0,0,-2.7717,1,-1.1481,-2.7717,1,1.1481],
// 5 24 -2.7717 1 -1.1481 -3.6956 0 -1.5308 -2.1213 1 -2.1213 -3 1 0
  [5,24,-2.7717,1,-1.1481,-3.6956,0,-1.5308,-2.1213,1,-2.1213,-3,1,0],
// 5 24 -2.1213 1 -2.1213 -2.8284 0 -2.8284 -1.1481 1 -2.7717 -2.7717 1 -1.1481
  [5,24,-2.1213,1,-2.1213,-2.8284,0,-2.8284,-1.1481,1,-2.7717,-2.7717,1,-1.1481],
// 5 24 -1.1481 1 -2.7717 -1.5308 0 -3.6956 0 1 -3 -2.1213 1 -2.1213
  [5,24,-1.1481,1,-2.7717,-1.5308,0,-3.6956,0,1,-3,-2.1213,1,-2.1213],
// 5 24 0 1 -3 0 0 -4 1.1481 1 -2.7717 -1.1481 1 -2.7717
  [5,24,0,1,-3,0,0,-4,1.1481,1,-2.7717,-1.1481,1,-2.7717],
// 5 24 1.1481 1 -2.7717 1.5308 0 -3.6956 2.1213 1 -2.1213 0 1 -3
  [5,24,1.1481,1,-2.7717,1.5308,0,-3.6956,2.1213,1,-2.1213,0,1,-3],
// 5 24 2.1213 1 -2.1213 2.8284 0 -2.8284 2.7717 1 -1.1481 1.1481 1 -2.7717
  [5,24,2.1213,1,-2.1213,2.8284,0,-2.8284,2.7717,1,-1.1481,1.1481,1,-2.7717],
// 5 24 2.7717 1 -1.1481 3.6956 0 -1.5308 3 1 0 2.1213 1 -2.1213
  [5,24,2.7717,1,-1.1481,3.6956,0,-1.5308,3,1,0,2.1213,1,-2.1213],
// 
// 4 16 3 1 0 2.7717 1 1.1481 3.6956 0 1.5308 4 0 0
  [4,16,3,1,0,2.7717,1,1.1481,3.6956,0,1.5308,4,0,0],
// 4 16 2.7717 1 1.1481 2.1213 1 2.1213 2.8284 0 2.8284 3.6956 0 1.5308
  [4,16,2.7717,1,1.1481,2.1213,1,2.1213,2.8284,0,2.8284,3.6956,0,1.5308],
// 4 16 2.1213 1 2.1213 1.1481 1 2.7717 1.5308 0 3.6956 2.8284 0 2.8284
  [4,16,2.1213,1,2.1213,1.1481,1,2.7717,1.5308,0,3.6956,2.8284,0,2.8284],
// 4 16 1.1481 1 2.7717 0 1 3 0 0 4 1.5308 0 3.6956
  [4,16,1.1481,1,2.7717,0,1,3,0,0,4,1.5308,0,3.6956],
// 4 16 0 1 3 -1.1481 1 2.7717 -1.5308 0 3.6956 0 0 4
  [4,16,0,1,3,-1.1481,1,2.7717,-1.5308,0,3.6956,0,0,4],
// 4 16 -1.1481 1 2.7717 -2.1213 1 2.1213 -2.8284 0 2.8284 -1.5308 0 3.6956
  [4,16,-1.1481,1,2.7717,-2.1213,1,2.1213,-2.8284,0,2.8284,-1.5308,0,3.6956],
// 4 16 -2.1213 1 2.1213 -2.7717 1 1.1481 -3.6956 0 1.5308 -2.8284 0 2.8284
  [4,16,-2.1213,1,2.1213,-2.7717,1,1.1481,-3.6956,0,1.5308,-2.8284,0,2.8284],
// 4 16 -2.7717 1 1.1481 -3 1 0 -4 0 0 -3.6956 0 1.5308
  [4,16,-2.7717,1,1.1481,-3,1,0,-4,0,0,-3.6956,0,1.5308],
// 4 16 -3 1 0 -2.7717 1 -1.1481 -3.6956 0 -1.5308 -4 0 0
  [4,16,-3,1,0,-2.7717,1,-1.1481,-3.6956,0,-1.5308,-4,0,0],
// 4 16 -2.7717 1 -1.1481 -2.1213 1 -2.1213 -2.8284 0 -2.8284 -3.6956 0 -1.5308
  [4,16,-2.7717,1,-1.1481,-2.1213,1,-2.1213,-2.8284,0,-2.8284,-3.6956,0,-1.5308],
// 4 16 -2.1213 1 -2.1213 -1.1481 1 -2.7717 -1.5308 0 -3.6956 -2.8284 0 -2.8284
  [4,16,-2.1213,1,-2.1213,-1.1481,1,-2.7717,-1.5308,0,-3.6956,-2.8284,0,-2.8284],
// 4 16 -1.1481 1 -2.7717 0 1 -3 0 0 -4 -1.5308 0 -3.6956
  [4,16,-1.1481,1,-2.7717,0,1,-3,0,0,-4,-1.5308,0,-3.6956],
// 4 16 0 1 -3 1.1481 1 -2.7717 1.5308 0 -3.6956 0 0 -4
  [4,16,0,1,-3,1.1481,1,-2.7717,1.5308,0,-3.6956,0,0,-4],
// 4 16 1.1481 1 -2.7717 2.1213 1 -2.1213 2.8284 0 -2.8284 1.5308 0 -3.6956
  [4,16,1.1481,1,-2.7717,2.1213,1,-2.1213,2.8284,0,-2.8284,1.5308,0,-3.6956],
// 4 16 2.1213 1 -2.1213 2.7717 1 -1.1481 3.6956 0 -1.5308 2.8284 0 -2.8284
  [4,16,2.1213,1,-2.1213,2.7717,1,-1.1481,3.6956,0,-1.5308,2.8284,0,-2.8284],
// 4 16 2.7717 1 -1.1481 3 1 0 4 0 0 3.6956 0 -1.5308
  [4,16,2.7717,1,-1.1481,3,1,0,4,0,0,3.6956,0,-1.5308],
// 
// 0
// 
];
makepoly(ldraw_lib__4_4con3(), line=0.2);
// main file
use <../lib.scad>
use <../p/4-4con3.scad>
use <../p/4-4con4.scad>
use <../p/4-4cyli.scad>
use <../p/4-4disc.scad>
use <../p/4-4edge.scad>
use <../p/4-4ring1.scad>
use <../p/4-4ring3.scad>
use <../p/4-4ring4.scad>
use <../p/stud.scad>
function ldraw_lib__450() = [
// 0 ~Wheel  6.4 x  8
// 0 Name: 450.dat
// 0 Author: Niels Karsdorp [nielsk]
// 0 !LDRAW_ORG Part UPDATE 2012-01
// 0 !LICENSE Licensed under CC BY 2.0 and CC BY 4.0 : see CAreadme.txt
// 
// 0 BFC CERTIFY CCW
  [0,"BFC","CERTIFY"],
  [0,"BFC","CCW"],
// 
// 0 !CMDLINE -c4
// 
// 0 !HISTORY 2012-03-30 [PTadmin] Official Update 2012-01
// 
// 
// 1 16 0 0 -8 0 0 2 2 0 0 0 1 0 4-4edge.dat
  [1,16,0,0,-8,0,0,2,2,0,0,0,1,0, ldraw_lib__4_4edge()],
// 1 16 0 0 8 0 0 2 2 0 0 0 1 0 4-4edge.dat
  [1,16,0,0,8,0,0,2,2,0,0,0,1,0, ldraw_lib__4_4edge()],
// 1 16 0 0 8 0 0 10 10 0 0 0 1 0 4-4edge.dat
  [1,16,0,0,8,0,0,10,10,0,0,0,1,0, ldraw_lib__4_4edge()],
// 1 16 0 0 5 0 0 10 10 0 0 0 1 0 4-4edge.dat
  [1,16,0,0,5,0,0,10,10,0,0,0,1,0, ldraw_lib__4_4edge()],
// 1 16 0 0 3 0 0 6 6 0 0 0 1 0 4-4edge.dat
  [1,16,0,0,3,0,0,6,6,0,0,0,1,0, ldraw_lib__4_4edge()],
// 1 16 0 0 -3 0 0 6 6 0 0 0 1 0 4-4edge.dat
  [1,16,0,0,-3,0,0,6,6,0,0,0,1,0, ldraw_lib__4_4edge()],
// 1 16 0 0 -5 0 0 10 10 0 0 0 1 0 4-4edge.dat
  [1,16,0,0,-5,0,0,10,10,0,0,0,1,0, ldraw_lib__4_4edge()],
// 1 16 0 0 -8 0 0 10 10 0 0 0 1 0 4-4edge.dat
  [1,16,0,0,-8,0,0,10,10,0,0,0,1,0, ldraw_lib__4_4edge()],
// 
// 1 16 0 0 8 0 0 2 2 0 0 0 -1 0 4-4ring1.dat
  [1,16,0,0,8,0,0,2,2,0,0,0,-1,0, ldraw_lib__4_4ring1()],
// 1 16 0 0 8 0 0 4 4 0 0 0 -1 0 4-4ring1.dat
  [1,16,0,0,8,0,0,4,4,0,0,0,-1,0, ldraw_lib__4_4ring1()],
// 1 16 0 0 8 0 0 2 2 0 0 0 -1 0 4-4ring4.dat
  [1,16,0,0,8,0,0,2,2,0,0,0,-1,0, ldraw_lib__4_4ring4()],
// 1 16 0 0 -8 0 0 2 2 0 0 0 -1 0 4-4disc.dat
  [1,16,0,0,-8,0,0,2,2,0,0,0,-1,0, ldraw_lib__4_4disc()],
// 0 BFC INVERTNEXT
  [0,"BFC","INVERTNEXT"],
// 1 16 0 0 8 0 0 2 2 0 0 0 -16 0 4-4cyli.dat
  [1,16,0,0,8,0,0,2,2,0,0,0,-16,0, ldraw_lib__4_4cyli()],
// 1 16 0 0 5 0 0 10 10 0 0 0 3 0 4-4cyli.dat
  [1,16,0,0,5,0,0,10,10,0,0,0,3,0, ldraw_lib__4_4cyli()],
// 1 16 0 0 5 2 0 0 0 0 2 0 -1 0 4-4con4.dat
  [1,16,0,0,5,2,0,0,0,0,2,0,-1,0, ldraw_lib__4_4con4()],
// 1 16 0 0 4 2 0 0 0 0 2 0 -1 0 4-4con3.dat
  [1,16,0,0,4,2,0,0,0,0,2,0,-1,0, ldraw_lib__4_4con3()],
// 1 16 0 0 -3 0 0 6 6 0 0 0 6 0 4-4cyli.dat
  [1,16,0,0,-3,0,0,6,6,0,0,0,6,0, ldraw_lib__4_4cyli()],
// 1 16 0 0 -5 2 0 0 0 0 2 0 1 0 4-4con4.dat
  [1,16,0,0,-5,2,0,0,0,0,2,0,1,0, ldraw_lib__4_4con4()],
// 1 16 0 0 -4 2 0 0 0 0 2 0 1 0 4-4con3.dat
  [1,16,0,0,-4,2,0,0,0,0,2,0,1,0, ldraw_lib__4_4con3()],
// 1 16 0 0 -8 0 0 10 10 0 0 0 3 0 4-4cyli.dat
  [1,16,0,0,-8,0,0,10,10,0,0,0,3,0, ldraw_lib__4_4cyli()],
// 1 16 0 0 -8 0 0 2 2 0 0 0 1 0 4-4ring3.dat
  [1,16,0,0,-8,0,0,2,2,0,0,0,1,0, ldraw_lib__4_4ring3()],
// 1 16 0 0 -8 0 0 2 2 0 0 0 1 0 4-4ring4.dat
  [1,16,0,0,-8,0,0,2,2,0,0,0,1,0, ldraw_lib__4_4ring4()],
// 1 16 0 0 -8 1 0 0 0 0 -1 0 1 0 stud.dat
  [1,16,0,0,-8,1,0,0,0,0,-1,0,1,0, ldraw_lib__stud()],
];
makepoly(ldraw_lib__450(), line=0.2);
